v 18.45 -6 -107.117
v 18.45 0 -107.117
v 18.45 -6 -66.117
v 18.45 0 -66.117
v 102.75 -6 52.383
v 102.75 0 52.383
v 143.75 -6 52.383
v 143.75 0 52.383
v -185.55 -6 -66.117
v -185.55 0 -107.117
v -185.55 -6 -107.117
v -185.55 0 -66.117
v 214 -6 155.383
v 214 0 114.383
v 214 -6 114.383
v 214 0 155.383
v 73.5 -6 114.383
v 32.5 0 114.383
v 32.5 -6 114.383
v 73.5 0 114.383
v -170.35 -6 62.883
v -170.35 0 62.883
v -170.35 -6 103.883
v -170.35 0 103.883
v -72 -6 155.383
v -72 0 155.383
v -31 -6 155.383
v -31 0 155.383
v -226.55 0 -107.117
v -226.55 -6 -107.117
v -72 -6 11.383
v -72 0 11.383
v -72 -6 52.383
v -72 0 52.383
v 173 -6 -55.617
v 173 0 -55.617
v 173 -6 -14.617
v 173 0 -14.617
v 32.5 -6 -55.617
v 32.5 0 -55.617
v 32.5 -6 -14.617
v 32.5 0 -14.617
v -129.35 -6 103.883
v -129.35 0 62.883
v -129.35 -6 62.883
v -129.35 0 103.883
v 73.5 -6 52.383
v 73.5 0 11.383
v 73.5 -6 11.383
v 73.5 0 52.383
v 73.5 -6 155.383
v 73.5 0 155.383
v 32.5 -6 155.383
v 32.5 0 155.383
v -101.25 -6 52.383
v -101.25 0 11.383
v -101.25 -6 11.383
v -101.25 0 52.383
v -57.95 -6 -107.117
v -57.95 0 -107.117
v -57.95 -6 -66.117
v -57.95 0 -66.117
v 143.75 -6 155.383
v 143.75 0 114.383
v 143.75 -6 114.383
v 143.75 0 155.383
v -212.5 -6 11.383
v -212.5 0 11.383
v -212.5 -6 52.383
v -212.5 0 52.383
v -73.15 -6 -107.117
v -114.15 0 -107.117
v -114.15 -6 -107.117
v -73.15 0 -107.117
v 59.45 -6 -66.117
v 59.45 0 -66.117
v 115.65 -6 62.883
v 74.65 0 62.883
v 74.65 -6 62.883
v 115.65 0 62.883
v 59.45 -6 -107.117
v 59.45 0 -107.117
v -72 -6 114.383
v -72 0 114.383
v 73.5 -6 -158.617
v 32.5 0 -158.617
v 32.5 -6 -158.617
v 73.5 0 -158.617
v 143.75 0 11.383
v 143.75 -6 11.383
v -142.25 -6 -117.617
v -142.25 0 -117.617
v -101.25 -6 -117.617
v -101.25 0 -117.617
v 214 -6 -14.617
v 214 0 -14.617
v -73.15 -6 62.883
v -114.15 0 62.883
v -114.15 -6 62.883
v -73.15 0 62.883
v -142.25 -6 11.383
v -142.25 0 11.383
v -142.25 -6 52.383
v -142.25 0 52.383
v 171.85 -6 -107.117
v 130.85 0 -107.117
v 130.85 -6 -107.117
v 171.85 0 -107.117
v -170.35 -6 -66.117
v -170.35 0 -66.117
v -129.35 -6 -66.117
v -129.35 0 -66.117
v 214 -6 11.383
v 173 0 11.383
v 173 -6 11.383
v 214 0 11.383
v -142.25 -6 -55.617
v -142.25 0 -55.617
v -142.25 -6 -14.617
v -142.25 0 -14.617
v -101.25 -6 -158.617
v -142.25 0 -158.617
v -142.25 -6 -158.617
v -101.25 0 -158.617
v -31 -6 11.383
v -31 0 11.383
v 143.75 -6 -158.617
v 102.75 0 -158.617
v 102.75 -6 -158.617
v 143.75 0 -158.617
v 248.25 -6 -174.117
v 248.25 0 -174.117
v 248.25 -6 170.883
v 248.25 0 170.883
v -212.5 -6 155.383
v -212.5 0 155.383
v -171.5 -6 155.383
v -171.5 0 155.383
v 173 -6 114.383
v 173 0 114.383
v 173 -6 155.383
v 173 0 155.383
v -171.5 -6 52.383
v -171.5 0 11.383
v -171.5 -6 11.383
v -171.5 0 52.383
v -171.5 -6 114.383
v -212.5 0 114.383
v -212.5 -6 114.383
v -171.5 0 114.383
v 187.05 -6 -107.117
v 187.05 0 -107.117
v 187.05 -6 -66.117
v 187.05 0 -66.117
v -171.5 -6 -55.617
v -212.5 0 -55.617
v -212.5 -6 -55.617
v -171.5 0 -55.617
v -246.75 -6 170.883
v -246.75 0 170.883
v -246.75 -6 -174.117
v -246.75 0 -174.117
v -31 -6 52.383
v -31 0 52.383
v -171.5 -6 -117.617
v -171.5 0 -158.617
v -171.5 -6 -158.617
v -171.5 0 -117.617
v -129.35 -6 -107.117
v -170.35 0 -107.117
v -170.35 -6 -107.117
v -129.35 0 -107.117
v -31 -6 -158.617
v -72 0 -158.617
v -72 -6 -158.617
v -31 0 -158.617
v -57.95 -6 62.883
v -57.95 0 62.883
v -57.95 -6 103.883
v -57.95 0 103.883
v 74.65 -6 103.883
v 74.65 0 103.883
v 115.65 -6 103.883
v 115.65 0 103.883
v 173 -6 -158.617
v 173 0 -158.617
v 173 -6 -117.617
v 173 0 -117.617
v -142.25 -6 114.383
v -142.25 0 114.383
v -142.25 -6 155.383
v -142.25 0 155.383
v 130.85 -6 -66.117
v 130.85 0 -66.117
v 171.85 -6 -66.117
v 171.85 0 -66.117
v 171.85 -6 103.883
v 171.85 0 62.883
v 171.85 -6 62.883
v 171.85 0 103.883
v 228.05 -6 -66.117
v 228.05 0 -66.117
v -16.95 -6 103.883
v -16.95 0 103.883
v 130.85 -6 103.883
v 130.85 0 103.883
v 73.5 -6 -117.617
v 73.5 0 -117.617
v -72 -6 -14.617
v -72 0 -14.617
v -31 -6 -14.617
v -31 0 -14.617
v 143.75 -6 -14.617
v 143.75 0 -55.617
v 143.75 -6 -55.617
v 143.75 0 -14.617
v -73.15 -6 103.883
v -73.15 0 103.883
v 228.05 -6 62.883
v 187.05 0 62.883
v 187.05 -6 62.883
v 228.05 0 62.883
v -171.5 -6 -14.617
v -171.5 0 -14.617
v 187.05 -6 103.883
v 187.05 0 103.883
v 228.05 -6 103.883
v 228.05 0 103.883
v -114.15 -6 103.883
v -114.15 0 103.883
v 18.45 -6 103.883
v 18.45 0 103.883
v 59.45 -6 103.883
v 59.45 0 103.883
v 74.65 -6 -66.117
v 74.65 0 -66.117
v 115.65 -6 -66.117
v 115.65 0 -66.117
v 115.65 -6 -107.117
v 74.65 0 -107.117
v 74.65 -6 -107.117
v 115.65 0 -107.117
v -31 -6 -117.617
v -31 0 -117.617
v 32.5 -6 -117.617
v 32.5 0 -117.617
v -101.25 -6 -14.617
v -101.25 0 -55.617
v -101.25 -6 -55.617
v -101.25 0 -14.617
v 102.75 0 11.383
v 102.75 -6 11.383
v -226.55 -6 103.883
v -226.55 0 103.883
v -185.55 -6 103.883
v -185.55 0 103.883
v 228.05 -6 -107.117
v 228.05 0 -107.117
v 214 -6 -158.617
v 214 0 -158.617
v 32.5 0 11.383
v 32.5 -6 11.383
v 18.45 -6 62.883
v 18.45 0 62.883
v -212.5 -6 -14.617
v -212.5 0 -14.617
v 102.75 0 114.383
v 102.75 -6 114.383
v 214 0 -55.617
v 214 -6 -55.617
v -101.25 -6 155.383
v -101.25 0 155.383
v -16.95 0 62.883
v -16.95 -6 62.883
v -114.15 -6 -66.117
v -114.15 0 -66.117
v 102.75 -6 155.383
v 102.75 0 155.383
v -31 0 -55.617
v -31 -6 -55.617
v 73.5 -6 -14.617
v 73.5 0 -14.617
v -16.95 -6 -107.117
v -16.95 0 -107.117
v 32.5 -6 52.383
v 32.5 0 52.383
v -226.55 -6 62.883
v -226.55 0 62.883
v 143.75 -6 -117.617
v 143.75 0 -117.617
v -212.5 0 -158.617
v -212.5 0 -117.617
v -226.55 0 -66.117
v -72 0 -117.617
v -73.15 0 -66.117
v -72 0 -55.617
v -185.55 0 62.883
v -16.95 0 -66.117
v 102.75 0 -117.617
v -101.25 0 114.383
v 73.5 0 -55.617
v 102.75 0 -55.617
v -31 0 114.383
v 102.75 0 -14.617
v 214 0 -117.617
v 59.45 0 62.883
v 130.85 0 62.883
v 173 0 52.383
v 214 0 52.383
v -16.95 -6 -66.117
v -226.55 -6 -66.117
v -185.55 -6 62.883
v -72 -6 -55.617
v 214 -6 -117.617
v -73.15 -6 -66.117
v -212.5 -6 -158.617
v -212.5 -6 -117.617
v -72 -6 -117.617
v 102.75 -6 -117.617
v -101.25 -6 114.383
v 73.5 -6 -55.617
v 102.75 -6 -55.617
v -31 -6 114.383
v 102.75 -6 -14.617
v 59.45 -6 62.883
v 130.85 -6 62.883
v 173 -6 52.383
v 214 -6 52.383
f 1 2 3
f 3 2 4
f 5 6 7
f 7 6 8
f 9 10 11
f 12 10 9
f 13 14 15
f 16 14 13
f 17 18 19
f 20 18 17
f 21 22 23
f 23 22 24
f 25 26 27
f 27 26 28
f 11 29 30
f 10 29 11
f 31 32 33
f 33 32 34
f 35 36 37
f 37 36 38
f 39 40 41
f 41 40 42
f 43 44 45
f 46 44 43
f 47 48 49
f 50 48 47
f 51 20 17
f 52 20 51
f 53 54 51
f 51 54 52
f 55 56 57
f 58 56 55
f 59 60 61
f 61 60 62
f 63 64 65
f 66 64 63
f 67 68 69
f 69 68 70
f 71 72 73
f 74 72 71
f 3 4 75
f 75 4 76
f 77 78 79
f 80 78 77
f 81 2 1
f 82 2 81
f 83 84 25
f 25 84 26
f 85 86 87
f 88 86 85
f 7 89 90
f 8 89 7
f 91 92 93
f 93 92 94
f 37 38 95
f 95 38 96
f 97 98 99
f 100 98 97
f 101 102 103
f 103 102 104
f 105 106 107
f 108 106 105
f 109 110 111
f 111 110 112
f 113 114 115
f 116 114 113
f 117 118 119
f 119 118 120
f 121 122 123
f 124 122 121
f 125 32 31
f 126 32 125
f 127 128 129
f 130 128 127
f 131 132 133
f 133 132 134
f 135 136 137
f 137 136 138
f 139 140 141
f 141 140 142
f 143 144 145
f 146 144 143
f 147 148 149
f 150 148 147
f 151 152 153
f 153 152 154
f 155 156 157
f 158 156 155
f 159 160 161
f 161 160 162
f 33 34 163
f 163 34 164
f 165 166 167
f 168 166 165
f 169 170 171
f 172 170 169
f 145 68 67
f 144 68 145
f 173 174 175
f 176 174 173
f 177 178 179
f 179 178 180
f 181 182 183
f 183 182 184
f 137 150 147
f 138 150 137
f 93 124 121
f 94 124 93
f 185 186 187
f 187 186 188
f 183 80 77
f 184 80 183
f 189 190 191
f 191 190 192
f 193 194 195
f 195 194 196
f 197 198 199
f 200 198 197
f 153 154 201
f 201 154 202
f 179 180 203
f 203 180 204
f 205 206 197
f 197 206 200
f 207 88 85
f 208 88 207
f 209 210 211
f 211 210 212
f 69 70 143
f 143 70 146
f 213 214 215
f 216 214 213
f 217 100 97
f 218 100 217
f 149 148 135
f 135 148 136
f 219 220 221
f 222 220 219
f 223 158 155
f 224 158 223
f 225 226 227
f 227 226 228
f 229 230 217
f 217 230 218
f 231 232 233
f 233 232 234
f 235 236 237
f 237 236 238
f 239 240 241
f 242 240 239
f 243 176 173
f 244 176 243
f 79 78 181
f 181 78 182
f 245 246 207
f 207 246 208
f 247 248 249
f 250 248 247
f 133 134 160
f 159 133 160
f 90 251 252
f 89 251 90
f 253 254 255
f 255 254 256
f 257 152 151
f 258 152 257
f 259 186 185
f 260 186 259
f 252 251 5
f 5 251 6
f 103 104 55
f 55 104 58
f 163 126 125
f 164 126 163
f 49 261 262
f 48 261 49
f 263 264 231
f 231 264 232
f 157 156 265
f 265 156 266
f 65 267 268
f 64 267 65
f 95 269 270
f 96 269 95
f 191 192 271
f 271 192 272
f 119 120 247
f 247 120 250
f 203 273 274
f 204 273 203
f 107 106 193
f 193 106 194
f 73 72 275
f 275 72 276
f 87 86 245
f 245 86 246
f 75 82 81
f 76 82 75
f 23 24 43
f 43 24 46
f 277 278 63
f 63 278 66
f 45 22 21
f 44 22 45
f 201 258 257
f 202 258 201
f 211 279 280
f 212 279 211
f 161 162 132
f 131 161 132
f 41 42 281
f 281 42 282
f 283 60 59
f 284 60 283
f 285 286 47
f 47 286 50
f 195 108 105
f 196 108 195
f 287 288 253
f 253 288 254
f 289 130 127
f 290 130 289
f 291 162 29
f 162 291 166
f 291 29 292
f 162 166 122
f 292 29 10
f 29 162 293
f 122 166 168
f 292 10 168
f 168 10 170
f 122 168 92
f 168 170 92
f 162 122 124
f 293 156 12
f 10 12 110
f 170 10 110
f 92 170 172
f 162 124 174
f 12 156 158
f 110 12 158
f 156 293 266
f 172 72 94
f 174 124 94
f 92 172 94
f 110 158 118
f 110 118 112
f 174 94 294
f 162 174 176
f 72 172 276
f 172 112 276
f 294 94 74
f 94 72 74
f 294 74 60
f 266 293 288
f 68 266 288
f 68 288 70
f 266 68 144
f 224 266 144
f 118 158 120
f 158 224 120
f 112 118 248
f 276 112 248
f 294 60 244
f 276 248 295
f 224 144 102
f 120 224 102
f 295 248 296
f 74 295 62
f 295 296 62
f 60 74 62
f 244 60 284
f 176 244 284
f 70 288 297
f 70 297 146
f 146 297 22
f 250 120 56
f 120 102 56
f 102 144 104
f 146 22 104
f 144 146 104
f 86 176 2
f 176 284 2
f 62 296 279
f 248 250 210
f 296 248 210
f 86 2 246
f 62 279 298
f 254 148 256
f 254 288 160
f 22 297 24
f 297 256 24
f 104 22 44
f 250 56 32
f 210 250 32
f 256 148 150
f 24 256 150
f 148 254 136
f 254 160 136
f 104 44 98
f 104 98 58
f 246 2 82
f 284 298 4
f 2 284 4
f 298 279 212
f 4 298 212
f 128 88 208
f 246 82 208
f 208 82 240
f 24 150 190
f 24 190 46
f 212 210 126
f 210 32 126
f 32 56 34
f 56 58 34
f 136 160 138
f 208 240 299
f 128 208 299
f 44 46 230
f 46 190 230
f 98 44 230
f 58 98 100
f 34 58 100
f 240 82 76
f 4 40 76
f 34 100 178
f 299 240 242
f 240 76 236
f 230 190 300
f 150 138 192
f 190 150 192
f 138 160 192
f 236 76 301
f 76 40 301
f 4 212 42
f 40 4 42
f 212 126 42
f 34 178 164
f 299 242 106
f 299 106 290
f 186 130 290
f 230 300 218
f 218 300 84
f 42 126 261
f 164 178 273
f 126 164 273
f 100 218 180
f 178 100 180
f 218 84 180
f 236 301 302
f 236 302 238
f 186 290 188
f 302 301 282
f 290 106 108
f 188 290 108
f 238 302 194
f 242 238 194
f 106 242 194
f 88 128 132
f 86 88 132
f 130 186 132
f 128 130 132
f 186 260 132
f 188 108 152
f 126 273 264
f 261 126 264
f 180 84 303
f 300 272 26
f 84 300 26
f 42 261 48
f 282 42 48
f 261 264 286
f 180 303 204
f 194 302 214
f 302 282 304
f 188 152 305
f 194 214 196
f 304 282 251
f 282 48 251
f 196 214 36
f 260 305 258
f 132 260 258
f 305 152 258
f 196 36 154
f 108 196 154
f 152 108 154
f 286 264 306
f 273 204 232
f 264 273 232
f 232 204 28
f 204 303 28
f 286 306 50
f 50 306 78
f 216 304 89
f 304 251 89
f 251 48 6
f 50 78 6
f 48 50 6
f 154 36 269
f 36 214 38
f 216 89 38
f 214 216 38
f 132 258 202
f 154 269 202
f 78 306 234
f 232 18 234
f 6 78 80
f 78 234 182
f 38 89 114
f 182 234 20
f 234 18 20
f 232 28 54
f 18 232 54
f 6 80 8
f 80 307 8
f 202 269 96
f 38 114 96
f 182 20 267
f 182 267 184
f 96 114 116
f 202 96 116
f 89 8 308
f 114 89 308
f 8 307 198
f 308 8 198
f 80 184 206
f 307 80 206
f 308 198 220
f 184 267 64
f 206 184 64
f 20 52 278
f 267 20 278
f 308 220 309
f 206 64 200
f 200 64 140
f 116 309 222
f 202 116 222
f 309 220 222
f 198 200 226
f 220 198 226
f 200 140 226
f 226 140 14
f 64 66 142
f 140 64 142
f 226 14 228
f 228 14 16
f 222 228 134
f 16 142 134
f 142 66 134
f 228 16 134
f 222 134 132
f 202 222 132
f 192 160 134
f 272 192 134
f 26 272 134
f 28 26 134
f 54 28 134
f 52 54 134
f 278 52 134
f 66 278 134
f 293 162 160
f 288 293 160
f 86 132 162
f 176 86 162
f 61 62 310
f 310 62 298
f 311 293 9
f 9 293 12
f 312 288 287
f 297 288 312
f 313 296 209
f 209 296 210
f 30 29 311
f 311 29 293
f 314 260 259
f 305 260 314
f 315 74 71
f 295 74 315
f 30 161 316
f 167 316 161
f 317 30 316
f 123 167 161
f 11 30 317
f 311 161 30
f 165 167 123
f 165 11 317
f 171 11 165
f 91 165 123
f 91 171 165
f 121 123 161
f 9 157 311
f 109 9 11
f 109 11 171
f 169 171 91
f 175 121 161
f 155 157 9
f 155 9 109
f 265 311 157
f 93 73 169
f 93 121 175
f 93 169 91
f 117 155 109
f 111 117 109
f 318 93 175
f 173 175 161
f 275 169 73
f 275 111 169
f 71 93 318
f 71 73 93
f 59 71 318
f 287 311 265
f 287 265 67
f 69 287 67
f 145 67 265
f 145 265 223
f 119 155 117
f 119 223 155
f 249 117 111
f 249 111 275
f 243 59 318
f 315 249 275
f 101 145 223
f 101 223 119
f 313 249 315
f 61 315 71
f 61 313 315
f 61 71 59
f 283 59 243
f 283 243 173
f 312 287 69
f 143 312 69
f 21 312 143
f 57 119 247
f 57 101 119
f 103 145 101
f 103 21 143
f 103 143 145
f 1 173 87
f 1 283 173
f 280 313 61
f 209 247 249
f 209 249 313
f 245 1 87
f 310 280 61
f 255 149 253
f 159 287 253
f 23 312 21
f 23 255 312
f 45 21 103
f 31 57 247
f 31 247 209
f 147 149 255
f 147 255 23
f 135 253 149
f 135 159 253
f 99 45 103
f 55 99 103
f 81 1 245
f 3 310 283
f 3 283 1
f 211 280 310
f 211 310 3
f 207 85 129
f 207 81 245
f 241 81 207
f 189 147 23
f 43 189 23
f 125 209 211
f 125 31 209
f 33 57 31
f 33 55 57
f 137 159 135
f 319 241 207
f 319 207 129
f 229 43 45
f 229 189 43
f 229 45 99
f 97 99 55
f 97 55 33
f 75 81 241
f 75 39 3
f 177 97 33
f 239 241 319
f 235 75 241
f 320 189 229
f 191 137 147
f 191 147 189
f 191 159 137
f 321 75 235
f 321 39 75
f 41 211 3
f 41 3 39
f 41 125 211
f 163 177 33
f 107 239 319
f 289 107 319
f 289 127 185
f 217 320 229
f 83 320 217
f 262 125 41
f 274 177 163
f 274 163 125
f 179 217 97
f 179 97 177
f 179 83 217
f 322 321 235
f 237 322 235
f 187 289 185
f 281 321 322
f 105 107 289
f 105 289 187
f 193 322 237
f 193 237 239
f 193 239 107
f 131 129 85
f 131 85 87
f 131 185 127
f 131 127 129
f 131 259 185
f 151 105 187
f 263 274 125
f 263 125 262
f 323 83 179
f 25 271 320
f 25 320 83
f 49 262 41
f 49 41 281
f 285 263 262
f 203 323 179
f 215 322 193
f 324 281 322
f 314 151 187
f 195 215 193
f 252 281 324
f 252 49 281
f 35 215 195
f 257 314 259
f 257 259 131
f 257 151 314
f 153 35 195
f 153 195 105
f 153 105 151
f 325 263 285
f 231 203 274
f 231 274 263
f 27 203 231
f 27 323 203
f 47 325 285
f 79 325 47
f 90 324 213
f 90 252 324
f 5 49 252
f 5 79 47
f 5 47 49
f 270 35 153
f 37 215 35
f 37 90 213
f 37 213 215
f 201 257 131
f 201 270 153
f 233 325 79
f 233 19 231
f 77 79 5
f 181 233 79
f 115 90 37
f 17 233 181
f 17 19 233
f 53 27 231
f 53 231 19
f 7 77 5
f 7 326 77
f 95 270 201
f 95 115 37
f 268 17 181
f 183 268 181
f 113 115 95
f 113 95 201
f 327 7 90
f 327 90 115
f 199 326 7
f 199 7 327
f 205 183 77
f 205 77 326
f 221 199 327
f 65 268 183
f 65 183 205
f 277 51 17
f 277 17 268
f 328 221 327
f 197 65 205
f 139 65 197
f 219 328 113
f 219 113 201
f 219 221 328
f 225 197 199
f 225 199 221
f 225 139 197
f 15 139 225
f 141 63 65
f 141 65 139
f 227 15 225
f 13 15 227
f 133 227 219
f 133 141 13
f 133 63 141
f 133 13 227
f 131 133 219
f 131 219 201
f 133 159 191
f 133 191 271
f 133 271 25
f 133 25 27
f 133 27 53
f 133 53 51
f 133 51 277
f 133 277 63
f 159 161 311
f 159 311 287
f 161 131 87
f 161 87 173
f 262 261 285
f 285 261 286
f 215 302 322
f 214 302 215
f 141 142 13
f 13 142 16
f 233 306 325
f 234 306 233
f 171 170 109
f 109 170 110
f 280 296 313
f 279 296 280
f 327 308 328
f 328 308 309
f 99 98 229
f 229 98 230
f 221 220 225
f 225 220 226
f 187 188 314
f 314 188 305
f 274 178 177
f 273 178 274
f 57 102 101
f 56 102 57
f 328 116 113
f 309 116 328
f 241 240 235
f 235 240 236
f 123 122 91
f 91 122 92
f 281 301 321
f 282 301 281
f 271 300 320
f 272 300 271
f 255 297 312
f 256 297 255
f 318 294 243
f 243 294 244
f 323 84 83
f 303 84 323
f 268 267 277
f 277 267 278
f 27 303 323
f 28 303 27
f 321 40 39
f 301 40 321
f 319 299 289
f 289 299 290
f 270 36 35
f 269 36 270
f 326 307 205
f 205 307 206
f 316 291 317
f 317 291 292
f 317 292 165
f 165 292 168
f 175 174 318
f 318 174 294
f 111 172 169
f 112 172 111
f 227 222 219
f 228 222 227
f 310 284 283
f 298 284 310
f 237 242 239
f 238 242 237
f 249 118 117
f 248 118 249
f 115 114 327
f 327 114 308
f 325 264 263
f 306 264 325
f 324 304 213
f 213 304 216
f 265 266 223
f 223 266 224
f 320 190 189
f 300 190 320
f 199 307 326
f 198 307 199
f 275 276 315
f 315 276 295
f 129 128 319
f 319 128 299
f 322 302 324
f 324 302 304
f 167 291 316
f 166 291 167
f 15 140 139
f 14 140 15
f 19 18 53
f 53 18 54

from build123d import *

# Parameters (mm, degrees)
F0_W     = 41
F0_H     = 41
F1_DEPTH = 6


with BuildPart() as f1:
    # F0 (on Front) → F1 (new body)
    with BuildSketch(Plane.XZ):
        Polygon((-226.75, -174.116667), (228.25, -174.116667), (248.25, -174.116667), (248.25, -154.116667), (248.25, 150.883333), (248.25, 170.883333), (227.5, 170.883333), (-227.5, 170.883333), (-246.75, 170.883333), (-246.75, 152.5), (-246.75, -152.5), (-246.75, -174.116667), align=None)
        with Locations((-192, -138.116667)):
            Rectangle(F0_W, F0_H, mode=Mode.SUBTRACT)
        with Locations((-121.75, -138.116667)):
            Rectangle(F0_W, F0_H, mode=Mode.SUBTRACT)
        with Locations((-51.5, -138.116667)):
            Rectangle(F0_W, F0_H, mode=Mode.SUBTRACT)
        with Locations((-206.05, -86.616667)):
            Rectangle(F0_W, F0_H, mode=Mode.SUBTRACT)
        with Locations((-149.85, -86.616667)):
            Rectangle(F0_W, F0_H, mode=Mode.SUBTRACT)
        with Locations((-192, -35.116667)):
            Rectangle(F0_W, F0_H, mode=Mode.SUBTRACT)
        with Locations((-93.65, -86.616667)):
            Rectangle(F0_W, F0_H, mode=Mode.SUBTRACT)
        with Locations((-37.45, -86.616667)):
            Rectangle(F0_W, F0_H, mode=Mode.SUBTRACT)
        with Locations((-121.75, -35.116667)):
            Rectangle(F0_W, F0_H, mode=Mode.SUBTRACT)
        with Locations((-51.5, -35.116667)):
            Rectangle(F0_W, F0_H, mode=Mode.SUBTRACT)
        with Locations((53, -138.116667)):
            Rectangle(F0_W, F0_H, mode=Mode.SUBTRACT)
        with Locations((123.25, -138.116667)):
            Rectangle(F0_W, F0_H, mode=Mode.SUBTRACT)
        with Locations((193.5, -138.116667)):
            Rectangle(F0_W, F0_H, mode=Mode.SUBTRACT)
        with Locations((38.95, -86.616667)):
            Rectangle(F0_W, F0_H, mode=Mode.SUBTRACT)
        with Locations((95.15, -86.616667)):
            Rectangle(F0_W, F0_H, mode=Mode.SUBTRACT)
        with Locations((53, -35.116667)):
            Rectangle(F0_W, F0_H, mode=Mode.SUBTRACT)
        with Locations((123.25, -35.116667)):
            Rectangle(F0_W, F0_H, mode=Mode.SUBTRACT)
        with Locations((151.35, -86.616667)):
            Rectangle(F0_W, F0_H, mode=Mode.SUBTRACT)
        with Locations((207.55, -86.616667)):
            Rectangle(F0_W, F0_H, mode=Mode.SUBTRACT)
        with Locations((193.5, -35.116667)):
            Rectangle(F0_W, F0_H, mode=Mode.SUBTRACT)
        with Locations((-192, 31.883333)):
            Rectangle(F0_W, F0_H, mode=Mode.SUBTRACT)
        with Locations((-206.05, 83.383333)):
            Rectangle(F0_W, F0_H, mode=Mode.SUBTRACT)
        with Locations((-149.85, 83.383333)):
            Rectangle(F0_W, F0_H, mode=Mode.SUBTRACT)
        with Locations((-121.75, 31.883333)):
            Rectangle(F0_W, F0_H, mode=Mode.SUBTRACT)
        with Locations((-51.5, 31.883333)):
            Rectangle(F0_W, F0_H, mode=Mode.SUBTRACT)
        with Locations((-93.65, 83.383333)):
            Rectangle(F0_W, F0_H, mode=Mode.SUBTRACT)
        with Locations((-37.45, 83.383333)):
            Rectangle(F0_W, F0_H, mode=Mode.SUBTRACT)
        with Locations((-192, 134.883333)):
            Rectangle(F0_W, F0_H, mode=Mode.SUBTRACT)
        with Locations((-121.75, 134.883333)):
            Rectangle(F0_W, F0_H, mode=Mode.SUBTRACT)
        with Locations((-51.5, 134.883333)):
            Rectangle(F0_W, F0_H, mode=Mode.SUBTRACT)
        with Locations((53, 31.883333)):
            Rectangle(F0_W, F0_H, mode=Mode.SUBTRACT)
        with Locations((123.25, 31.883333)):
            Rectangle(F0_W, F0_H, mode=Mode.SUBTRACT)
        with Locations((38.95, 83.383333)):
            Rectangle(F0_W, F0_H, mode=Mode.SUBTRACT)
        with Locations((95.15, 83.383333)):
            Rectangle(F0_W, F0_H, mode=Mode.SUBTRACT)
        with Locations((193.5, 31.883333)):
            Rectangle(F0_W, F0_H, mode=Mode.SUBTRACT)
        with Locations((151.35, 83.383333)):
            Rectangle(F0_W, F0_H, mode=Mode.SUBTRACT)
        with Locations((207.55, 83.383333)):
            Rectangle(F0_W, F0_H, mode=Mode.SUBTRACT)
        with Locations((53, 134.883333)):
            Rectangle(F0_W, F0_H, mode=Mode.SUBTRACT)
        with Locations((123.25, 134.883333)):
            Rectangle(F0_W, F0_H, mode=Mode.SUBTRACT)
        with Locations((193.5, 134.883333)):
            Rectangle(F0_W, F0_H, mode=Mode.SUBTRACT)
    extrude(amount=F1_DEPTH)


solid = f1.part
